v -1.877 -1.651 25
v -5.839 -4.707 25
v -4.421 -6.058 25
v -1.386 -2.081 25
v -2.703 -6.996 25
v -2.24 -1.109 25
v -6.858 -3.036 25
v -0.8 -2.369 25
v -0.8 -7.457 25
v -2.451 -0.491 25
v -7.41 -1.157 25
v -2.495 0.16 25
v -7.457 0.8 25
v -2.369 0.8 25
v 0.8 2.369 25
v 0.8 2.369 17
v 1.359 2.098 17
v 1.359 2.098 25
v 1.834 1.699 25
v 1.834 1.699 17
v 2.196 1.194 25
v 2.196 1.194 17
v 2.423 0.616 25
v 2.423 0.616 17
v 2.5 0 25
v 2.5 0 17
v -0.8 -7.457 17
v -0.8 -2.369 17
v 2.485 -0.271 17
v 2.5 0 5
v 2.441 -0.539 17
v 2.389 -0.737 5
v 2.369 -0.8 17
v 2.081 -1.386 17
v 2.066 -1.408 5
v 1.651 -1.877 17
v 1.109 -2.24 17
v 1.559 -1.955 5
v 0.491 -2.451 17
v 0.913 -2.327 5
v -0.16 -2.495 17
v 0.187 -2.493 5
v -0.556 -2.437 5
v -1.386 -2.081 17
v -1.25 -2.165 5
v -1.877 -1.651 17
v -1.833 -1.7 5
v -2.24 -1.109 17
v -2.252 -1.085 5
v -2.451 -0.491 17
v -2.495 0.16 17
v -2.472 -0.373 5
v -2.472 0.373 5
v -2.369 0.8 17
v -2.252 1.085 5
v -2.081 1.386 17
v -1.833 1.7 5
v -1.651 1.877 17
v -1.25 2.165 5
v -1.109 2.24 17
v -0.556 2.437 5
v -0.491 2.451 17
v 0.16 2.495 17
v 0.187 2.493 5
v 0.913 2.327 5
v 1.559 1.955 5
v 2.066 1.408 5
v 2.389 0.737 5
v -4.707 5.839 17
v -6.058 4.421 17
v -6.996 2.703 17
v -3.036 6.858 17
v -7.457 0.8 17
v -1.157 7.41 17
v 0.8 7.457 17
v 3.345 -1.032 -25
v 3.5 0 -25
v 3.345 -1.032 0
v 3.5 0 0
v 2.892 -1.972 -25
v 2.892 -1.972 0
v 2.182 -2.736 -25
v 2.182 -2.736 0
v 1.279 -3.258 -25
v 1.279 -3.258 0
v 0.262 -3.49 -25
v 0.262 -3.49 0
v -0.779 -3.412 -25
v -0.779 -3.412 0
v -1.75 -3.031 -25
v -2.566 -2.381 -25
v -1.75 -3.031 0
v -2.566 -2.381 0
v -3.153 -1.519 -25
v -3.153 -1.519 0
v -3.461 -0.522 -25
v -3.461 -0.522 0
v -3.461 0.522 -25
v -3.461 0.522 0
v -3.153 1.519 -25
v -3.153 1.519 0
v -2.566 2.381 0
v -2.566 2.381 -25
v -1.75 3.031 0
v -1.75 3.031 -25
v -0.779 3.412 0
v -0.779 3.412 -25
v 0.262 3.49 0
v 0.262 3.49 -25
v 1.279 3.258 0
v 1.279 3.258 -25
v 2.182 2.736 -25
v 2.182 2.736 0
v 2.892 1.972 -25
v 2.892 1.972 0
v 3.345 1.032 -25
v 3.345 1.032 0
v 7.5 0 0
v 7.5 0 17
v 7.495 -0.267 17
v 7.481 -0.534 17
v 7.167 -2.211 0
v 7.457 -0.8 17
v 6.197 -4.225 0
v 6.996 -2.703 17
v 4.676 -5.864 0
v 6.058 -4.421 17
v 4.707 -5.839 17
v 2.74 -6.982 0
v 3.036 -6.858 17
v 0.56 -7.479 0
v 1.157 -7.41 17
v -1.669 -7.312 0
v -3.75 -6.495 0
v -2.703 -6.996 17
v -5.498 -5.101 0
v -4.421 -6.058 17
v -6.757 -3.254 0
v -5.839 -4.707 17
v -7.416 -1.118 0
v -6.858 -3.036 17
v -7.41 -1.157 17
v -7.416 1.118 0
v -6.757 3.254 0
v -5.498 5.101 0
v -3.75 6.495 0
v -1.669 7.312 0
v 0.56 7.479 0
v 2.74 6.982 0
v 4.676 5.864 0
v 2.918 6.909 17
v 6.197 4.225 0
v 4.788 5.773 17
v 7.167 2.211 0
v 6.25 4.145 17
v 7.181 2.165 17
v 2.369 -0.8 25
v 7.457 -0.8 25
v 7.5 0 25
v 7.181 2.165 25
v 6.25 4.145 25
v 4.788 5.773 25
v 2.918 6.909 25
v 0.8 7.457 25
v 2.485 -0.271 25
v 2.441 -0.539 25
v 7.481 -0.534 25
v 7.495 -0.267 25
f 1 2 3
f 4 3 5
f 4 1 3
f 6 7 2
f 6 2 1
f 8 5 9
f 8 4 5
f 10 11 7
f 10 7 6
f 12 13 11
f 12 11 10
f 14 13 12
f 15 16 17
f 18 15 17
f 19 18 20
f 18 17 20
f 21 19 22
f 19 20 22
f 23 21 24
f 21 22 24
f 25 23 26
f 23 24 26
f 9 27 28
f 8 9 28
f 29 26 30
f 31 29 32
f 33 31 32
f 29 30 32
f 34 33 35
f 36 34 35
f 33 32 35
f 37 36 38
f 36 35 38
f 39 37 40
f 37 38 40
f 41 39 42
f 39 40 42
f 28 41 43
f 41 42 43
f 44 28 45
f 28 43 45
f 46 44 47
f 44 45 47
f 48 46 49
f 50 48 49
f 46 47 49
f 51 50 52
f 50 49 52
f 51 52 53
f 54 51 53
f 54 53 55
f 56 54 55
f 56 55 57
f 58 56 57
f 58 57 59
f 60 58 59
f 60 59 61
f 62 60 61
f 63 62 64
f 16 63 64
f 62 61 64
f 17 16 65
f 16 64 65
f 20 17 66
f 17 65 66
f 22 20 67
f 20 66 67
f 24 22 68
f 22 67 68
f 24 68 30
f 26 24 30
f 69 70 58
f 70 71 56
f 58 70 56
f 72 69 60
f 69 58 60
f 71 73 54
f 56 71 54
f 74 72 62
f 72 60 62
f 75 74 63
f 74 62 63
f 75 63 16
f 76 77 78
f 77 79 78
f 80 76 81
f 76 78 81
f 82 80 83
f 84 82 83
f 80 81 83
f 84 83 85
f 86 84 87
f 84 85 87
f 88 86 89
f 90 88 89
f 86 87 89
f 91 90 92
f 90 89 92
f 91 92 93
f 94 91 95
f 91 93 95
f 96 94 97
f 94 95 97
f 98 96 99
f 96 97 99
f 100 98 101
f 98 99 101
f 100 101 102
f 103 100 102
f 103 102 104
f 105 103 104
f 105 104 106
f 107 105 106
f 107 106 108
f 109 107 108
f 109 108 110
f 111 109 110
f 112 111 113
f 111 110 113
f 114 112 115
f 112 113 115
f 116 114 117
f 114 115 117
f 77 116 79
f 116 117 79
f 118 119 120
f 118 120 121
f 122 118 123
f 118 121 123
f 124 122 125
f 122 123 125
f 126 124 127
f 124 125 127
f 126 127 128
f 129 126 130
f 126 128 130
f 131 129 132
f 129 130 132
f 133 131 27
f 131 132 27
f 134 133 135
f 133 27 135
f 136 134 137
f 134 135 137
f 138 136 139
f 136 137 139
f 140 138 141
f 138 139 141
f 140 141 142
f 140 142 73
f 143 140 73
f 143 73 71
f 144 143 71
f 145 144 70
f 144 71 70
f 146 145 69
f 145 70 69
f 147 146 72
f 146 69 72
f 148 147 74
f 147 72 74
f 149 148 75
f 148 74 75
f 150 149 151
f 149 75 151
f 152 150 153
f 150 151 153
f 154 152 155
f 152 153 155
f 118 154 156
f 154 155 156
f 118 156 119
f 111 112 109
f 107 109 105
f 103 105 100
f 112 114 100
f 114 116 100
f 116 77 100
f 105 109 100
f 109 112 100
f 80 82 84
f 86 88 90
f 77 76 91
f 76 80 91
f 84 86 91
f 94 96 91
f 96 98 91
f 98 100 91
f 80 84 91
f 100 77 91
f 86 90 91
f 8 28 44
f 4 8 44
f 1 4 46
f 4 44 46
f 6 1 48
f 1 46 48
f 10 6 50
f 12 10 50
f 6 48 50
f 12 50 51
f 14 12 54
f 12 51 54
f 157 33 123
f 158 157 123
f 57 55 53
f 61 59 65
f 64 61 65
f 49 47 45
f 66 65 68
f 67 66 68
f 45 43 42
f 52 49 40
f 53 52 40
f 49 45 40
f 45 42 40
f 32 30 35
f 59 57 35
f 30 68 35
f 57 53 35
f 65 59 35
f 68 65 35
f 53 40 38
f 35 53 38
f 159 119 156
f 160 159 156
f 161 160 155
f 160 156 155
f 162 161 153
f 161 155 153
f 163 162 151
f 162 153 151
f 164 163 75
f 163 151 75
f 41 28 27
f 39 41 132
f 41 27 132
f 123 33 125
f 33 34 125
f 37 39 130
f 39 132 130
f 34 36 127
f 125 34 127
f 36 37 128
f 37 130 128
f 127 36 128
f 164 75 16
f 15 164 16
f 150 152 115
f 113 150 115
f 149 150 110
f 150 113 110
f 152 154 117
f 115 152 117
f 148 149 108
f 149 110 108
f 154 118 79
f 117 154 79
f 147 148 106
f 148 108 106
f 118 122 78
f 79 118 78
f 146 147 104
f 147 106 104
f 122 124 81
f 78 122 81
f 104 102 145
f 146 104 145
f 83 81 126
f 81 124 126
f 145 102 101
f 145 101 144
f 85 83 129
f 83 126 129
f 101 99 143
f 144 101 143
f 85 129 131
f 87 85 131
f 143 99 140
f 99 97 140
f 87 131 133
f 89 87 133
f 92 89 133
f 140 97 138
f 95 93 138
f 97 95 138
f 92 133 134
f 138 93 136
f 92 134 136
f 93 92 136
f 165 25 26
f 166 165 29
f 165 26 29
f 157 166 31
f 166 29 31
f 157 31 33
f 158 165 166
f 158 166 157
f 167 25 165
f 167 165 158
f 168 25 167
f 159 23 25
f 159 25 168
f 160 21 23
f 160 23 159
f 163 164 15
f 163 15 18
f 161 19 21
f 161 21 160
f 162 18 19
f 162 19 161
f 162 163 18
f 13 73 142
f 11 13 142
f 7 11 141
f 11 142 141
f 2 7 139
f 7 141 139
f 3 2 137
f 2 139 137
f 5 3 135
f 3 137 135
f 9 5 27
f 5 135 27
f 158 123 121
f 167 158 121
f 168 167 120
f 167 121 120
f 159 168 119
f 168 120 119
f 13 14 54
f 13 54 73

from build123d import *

# Parameters (mm, degrees)
F3_DEPTH = 8


# Not quite as in the source:
# - after a boolean that leaves OpenCascade's solid faulty, fix() repairs it


with BuildPart() as f1:
    # F0 (on Front) → F1 (revolve)
    with BuildSketch(Plane.XZ):
        Polygon((2.5, 5), (0, 5), (0, -25), (3.5, -25), (3.5, 0), (7.5, 0), (7.5, 17), (2.5, 17), align=None)
    revolve(axis=Axis((0, 0, -10), (0, 0, -1)))

    # F2 (on face) → F3 (join)
    with BuildSketch(Plane.XY.offset(17)):
        with BuildLine():
            ThreePointArc((7.5, 0), (5.5789784011, 5.0124844139), (0.8, 7.457211275))
            Line((0.8, 7.457211275), (0.8, 2.3685438565))
            ThreePointArc((0.8, 2.3685438565), (2.0310096012, 1.4577379737), (2.5, 0))
            ThreePointArc((2.5, 0), (2.466917068, -0.4053642552), (2.3685438565, -0.8))
            Line((2.3685438565, -0.8), (7.457211275, -0.8))
            ThreePointArc((7.457211275, -0.8), (7.4892951792, -0.4005717398), (7.5, 0))
        make_face()
        with BuildLine():
            Line((-2.3685438565, 0.8), (-7.457211275, 0.8))
            ThreePointArc((-7.457211275, 0.8), (-5.8387300862, -4.7073592363), (-0.8, -7.457211275))
            Line((-0.8, -7.457211275), (-0.8, -2.3685438565))
            ThreePointArc((-0.8, -2.3685438565), (-2.2404988474, -1.1091279975), (-2.3685438565, 0.8))
        make_face()
    extrude(amount=F3_DEPTH)

    add(f1.part.fix(), mode=Mode.REPLACE)


solid = f1.part
